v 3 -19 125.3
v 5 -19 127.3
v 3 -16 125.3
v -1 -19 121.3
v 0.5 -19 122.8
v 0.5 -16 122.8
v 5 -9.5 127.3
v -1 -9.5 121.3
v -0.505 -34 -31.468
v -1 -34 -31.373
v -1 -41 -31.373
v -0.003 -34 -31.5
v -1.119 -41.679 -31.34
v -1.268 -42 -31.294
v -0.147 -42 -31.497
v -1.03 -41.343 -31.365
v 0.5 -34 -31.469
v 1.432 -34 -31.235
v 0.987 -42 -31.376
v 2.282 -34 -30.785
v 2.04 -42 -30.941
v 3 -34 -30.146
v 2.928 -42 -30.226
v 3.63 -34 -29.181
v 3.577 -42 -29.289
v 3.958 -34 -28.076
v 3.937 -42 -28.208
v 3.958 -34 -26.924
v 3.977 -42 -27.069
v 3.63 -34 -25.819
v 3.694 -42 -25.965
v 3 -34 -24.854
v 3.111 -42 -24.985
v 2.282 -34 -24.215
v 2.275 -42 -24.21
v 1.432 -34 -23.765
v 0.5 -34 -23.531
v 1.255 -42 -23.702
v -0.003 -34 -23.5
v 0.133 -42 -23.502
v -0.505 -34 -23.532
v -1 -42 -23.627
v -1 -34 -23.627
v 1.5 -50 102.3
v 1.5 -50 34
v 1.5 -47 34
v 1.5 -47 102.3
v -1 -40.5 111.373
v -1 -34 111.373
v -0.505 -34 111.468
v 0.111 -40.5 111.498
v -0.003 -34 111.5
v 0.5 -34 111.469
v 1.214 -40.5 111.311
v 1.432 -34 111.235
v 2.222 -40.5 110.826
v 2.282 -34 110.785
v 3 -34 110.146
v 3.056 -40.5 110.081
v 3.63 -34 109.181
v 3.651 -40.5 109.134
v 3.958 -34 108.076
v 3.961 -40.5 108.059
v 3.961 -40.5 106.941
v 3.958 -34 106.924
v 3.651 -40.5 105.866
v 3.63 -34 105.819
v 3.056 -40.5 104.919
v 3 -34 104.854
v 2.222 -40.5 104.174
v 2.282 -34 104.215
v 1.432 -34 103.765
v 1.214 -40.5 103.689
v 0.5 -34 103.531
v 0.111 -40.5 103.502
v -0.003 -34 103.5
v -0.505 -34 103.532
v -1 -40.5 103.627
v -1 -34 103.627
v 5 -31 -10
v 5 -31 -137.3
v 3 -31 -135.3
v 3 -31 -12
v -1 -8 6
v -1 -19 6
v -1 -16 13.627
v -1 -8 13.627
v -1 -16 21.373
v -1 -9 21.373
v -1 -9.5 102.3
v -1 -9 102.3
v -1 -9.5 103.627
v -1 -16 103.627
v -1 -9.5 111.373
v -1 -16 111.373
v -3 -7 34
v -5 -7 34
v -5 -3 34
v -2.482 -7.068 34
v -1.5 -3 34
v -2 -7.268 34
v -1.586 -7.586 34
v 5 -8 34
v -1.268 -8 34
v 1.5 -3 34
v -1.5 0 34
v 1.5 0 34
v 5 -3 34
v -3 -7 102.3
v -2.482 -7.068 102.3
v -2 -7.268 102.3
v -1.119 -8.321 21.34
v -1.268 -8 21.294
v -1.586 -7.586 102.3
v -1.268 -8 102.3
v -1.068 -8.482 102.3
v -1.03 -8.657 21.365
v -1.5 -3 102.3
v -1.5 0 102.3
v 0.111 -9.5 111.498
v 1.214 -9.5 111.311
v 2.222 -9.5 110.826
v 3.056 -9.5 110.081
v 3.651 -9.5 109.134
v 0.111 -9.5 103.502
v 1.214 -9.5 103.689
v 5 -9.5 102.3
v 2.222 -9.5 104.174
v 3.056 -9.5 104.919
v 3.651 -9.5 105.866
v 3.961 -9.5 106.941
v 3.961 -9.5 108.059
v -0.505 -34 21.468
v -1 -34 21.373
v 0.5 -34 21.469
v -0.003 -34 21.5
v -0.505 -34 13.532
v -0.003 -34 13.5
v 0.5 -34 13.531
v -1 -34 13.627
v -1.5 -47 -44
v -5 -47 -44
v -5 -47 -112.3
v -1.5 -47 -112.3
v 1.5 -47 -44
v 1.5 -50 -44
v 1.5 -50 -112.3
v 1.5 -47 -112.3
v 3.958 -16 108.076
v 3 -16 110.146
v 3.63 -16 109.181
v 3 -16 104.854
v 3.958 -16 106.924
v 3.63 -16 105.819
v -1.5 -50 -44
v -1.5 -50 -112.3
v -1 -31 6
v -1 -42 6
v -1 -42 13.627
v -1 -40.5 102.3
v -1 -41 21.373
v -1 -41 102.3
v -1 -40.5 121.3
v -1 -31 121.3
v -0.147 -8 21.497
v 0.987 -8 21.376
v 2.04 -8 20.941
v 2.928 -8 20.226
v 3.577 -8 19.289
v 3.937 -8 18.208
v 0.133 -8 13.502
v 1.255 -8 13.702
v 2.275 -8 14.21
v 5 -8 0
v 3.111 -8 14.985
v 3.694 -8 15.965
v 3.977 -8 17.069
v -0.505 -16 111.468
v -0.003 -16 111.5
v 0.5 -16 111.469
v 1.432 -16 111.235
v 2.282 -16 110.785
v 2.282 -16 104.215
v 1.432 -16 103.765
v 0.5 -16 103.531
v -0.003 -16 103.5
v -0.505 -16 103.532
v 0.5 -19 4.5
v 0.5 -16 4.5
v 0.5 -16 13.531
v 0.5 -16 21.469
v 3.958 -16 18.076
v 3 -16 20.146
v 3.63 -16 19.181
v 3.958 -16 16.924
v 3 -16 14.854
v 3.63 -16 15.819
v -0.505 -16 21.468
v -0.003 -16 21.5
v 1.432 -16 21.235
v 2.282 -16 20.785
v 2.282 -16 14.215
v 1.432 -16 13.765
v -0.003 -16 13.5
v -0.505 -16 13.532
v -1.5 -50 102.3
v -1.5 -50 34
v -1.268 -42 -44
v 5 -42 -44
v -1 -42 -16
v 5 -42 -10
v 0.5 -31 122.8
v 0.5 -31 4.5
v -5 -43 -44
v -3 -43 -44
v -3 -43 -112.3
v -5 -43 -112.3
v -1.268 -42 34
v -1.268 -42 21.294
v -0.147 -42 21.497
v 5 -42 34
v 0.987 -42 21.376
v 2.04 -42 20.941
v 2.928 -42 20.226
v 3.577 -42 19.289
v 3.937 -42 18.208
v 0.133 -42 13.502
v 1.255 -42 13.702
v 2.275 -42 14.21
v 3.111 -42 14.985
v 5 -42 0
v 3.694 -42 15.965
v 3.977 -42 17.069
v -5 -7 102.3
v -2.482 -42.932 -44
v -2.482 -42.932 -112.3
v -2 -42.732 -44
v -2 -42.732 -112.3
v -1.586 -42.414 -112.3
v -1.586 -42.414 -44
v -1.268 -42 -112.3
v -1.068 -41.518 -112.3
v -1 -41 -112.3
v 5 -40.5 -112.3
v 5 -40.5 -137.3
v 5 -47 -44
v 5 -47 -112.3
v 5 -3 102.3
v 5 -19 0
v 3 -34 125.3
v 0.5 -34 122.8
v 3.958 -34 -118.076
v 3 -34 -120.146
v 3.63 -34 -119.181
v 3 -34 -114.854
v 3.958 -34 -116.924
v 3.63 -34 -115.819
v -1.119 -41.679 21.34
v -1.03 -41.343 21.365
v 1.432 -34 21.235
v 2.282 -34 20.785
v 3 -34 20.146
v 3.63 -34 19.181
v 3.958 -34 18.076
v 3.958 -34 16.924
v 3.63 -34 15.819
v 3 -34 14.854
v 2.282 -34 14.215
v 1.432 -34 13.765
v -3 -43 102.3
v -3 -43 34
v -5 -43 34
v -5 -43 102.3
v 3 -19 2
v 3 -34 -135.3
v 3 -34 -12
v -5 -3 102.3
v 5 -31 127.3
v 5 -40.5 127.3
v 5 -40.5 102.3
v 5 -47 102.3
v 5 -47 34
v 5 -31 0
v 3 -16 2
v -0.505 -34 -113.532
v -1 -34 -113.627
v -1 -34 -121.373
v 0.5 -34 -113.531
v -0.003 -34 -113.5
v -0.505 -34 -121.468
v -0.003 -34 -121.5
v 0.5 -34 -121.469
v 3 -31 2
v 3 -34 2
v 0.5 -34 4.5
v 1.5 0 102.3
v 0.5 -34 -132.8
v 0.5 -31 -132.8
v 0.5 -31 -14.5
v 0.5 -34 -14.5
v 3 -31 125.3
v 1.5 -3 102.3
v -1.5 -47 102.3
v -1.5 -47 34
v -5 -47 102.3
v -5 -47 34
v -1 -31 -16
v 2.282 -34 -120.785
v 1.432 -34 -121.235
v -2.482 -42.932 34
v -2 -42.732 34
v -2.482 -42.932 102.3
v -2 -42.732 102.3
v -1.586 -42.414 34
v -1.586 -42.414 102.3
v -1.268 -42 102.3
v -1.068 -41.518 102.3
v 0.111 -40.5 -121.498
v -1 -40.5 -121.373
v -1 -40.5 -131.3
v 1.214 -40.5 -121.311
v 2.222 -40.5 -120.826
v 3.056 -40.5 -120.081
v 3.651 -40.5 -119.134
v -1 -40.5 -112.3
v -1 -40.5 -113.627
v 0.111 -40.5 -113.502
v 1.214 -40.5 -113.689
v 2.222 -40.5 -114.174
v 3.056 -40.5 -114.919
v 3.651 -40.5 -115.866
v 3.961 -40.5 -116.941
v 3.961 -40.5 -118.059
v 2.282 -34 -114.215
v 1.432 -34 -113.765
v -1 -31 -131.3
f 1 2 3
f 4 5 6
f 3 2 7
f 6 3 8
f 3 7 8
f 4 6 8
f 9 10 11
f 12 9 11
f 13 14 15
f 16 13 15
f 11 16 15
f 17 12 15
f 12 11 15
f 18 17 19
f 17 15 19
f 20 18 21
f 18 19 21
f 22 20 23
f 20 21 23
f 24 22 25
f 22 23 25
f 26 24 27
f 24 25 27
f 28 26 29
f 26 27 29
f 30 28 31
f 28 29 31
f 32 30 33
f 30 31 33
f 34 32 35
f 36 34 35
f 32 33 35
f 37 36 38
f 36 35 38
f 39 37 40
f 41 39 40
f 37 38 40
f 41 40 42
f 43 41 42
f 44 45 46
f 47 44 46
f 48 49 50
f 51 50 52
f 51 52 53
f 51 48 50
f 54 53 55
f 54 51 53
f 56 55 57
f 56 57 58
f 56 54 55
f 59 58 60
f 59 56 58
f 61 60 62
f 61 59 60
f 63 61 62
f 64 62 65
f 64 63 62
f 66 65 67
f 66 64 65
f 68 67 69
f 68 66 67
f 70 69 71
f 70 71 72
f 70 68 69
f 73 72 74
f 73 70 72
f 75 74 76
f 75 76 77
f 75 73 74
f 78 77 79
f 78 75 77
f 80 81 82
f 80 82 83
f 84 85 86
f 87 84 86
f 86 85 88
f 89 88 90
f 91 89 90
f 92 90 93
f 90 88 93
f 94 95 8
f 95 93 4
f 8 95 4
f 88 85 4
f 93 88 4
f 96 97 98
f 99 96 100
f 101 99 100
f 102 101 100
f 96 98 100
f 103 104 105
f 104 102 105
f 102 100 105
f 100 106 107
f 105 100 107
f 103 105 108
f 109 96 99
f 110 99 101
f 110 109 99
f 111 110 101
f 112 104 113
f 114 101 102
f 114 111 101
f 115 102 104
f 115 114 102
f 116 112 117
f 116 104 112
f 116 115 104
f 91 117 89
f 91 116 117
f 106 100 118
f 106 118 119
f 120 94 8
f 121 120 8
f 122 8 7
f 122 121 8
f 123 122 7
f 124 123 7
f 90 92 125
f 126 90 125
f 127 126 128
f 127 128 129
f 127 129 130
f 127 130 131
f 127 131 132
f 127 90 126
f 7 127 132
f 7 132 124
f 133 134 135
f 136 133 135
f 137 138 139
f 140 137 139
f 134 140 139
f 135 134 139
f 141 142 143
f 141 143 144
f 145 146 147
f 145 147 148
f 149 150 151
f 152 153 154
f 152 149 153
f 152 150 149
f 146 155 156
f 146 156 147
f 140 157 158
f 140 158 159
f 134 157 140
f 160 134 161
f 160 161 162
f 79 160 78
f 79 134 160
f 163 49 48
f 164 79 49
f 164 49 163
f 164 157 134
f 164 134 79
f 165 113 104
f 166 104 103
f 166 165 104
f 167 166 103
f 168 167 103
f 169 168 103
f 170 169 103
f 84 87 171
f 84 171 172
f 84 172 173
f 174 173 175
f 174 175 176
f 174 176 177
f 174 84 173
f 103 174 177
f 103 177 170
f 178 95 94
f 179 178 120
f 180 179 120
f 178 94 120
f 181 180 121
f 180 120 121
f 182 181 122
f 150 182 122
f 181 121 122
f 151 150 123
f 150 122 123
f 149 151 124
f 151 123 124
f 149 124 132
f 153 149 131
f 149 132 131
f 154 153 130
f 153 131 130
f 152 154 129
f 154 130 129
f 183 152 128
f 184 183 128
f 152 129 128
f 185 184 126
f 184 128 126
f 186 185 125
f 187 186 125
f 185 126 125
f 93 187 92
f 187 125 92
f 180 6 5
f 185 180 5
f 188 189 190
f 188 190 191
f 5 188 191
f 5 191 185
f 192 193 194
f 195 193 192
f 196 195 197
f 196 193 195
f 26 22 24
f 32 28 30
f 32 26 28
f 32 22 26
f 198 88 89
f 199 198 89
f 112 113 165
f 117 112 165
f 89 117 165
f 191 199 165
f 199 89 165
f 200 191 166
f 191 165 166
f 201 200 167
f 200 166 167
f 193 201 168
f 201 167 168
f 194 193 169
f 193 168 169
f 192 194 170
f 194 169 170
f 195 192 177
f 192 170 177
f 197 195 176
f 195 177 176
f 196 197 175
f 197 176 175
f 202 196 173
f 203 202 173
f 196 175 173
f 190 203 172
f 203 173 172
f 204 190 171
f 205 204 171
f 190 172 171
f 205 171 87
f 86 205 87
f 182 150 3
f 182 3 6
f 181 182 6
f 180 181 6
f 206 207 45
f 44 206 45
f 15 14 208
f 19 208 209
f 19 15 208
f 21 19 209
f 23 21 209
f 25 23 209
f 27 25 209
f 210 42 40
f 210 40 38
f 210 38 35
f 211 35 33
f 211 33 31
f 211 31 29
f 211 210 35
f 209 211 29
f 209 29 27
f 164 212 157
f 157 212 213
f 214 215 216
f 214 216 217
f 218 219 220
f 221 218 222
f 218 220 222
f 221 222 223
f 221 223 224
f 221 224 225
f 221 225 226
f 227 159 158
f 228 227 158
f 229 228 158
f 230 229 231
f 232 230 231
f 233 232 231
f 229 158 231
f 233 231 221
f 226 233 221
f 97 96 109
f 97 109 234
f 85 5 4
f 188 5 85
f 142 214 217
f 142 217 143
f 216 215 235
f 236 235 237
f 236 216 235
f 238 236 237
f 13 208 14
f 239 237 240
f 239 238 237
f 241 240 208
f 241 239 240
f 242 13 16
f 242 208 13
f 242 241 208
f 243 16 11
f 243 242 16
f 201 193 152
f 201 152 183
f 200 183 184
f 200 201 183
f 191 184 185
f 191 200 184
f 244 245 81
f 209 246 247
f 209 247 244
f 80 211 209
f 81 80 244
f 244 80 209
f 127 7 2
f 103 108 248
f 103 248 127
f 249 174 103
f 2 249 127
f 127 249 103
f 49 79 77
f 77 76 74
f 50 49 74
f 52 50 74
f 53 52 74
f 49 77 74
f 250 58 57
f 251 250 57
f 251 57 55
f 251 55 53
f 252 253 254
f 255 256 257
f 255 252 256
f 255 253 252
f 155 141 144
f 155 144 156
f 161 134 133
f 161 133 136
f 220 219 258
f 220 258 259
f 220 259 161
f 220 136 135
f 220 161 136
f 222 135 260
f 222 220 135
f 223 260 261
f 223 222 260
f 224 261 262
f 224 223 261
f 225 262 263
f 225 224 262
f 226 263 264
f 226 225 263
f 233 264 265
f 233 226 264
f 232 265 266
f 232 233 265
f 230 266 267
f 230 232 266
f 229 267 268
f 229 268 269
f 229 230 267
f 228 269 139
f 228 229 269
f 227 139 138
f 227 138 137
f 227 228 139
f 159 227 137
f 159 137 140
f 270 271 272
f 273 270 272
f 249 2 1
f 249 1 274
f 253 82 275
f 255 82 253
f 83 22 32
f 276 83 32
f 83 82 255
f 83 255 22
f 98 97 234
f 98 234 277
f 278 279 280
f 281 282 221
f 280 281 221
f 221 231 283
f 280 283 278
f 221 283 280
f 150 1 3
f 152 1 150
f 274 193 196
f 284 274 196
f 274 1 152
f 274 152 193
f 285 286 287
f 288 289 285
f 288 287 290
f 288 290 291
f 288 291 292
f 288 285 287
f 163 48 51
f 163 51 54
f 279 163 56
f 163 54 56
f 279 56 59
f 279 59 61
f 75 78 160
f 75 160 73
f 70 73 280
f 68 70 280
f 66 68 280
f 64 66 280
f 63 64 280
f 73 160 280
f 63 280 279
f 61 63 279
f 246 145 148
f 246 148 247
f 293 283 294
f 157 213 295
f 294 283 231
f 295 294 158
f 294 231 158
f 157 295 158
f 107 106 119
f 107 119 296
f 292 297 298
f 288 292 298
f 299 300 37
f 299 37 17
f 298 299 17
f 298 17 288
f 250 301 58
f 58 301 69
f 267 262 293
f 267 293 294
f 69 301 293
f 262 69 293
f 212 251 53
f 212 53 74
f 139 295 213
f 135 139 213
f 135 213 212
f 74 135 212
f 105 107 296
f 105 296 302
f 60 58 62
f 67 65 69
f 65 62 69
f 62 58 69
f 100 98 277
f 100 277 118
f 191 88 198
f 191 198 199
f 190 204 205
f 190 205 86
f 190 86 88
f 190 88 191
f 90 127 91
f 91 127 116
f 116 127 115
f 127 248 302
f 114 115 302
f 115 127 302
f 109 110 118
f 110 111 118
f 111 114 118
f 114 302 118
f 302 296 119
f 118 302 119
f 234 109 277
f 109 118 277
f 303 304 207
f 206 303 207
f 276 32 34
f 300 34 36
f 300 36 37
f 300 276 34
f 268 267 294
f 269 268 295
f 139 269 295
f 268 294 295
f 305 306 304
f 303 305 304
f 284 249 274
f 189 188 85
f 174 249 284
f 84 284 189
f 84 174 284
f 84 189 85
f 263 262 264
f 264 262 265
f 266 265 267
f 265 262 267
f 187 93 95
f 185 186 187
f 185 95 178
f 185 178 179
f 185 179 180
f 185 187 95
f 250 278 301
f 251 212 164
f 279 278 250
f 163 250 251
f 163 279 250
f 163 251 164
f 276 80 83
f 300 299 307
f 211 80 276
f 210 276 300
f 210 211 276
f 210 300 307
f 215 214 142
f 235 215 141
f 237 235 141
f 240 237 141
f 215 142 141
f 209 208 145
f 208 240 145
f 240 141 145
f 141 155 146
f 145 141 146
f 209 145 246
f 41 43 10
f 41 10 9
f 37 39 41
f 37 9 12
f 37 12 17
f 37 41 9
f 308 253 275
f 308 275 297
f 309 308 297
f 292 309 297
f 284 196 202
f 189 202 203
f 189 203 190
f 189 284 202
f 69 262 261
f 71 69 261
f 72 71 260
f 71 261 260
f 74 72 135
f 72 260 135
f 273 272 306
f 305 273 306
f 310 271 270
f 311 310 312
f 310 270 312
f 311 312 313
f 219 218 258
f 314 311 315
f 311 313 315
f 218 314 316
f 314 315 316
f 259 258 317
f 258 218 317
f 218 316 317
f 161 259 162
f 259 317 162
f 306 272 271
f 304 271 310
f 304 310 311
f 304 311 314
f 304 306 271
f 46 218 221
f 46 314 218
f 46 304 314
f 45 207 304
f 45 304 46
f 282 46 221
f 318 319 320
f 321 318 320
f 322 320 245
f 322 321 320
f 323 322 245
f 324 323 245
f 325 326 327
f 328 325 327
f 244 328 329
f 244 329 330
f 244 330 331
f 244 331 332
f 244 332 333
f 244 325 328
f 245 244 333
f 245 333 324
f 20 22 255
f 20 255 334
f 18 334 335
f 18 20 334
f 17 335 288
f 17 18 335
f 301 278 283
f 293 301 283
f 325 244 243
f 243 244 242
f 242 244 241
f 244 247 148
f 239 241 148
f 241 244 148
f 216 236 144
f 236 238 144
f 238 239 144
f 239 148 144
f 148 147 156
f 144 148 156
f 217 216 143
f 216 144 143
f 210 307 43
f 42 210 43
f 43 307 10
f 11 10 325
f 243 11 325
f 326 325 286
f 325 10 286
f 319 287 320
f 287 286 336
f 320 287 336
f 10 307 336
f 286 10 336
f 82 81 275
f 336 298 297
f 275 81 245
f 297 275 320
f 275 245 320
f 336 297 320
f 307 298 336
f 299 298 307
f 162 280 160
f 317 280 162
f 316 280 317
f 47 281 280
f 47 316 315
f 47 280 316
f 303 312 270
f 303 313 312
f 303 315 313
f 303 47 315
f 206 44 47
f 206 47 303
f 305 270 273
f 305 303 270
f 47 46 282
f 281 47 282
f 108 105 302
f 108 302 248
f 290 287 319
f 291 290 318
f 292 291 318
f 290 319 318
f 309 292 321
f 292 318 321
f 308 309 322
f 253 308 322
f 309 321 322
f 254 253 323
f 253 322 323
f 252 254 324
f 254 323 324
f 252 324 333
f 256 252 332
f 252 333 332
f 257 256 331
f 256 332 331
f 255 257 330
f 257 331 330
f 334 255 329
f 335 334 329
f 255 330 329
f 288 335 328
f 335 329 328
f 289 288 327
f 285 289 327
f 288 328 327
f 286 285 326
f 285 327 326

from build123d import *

# Parameters (mm, degrees)
MAIN_DEPTH                      = 127.3
CUTDIAGONALE_DEPTH              = 20
CUTOTHERPIECEINROBOTRIGHT_DEPTH = 8
CUTOTHERPIECEINROBOTLEFT_DEPTH  = 9.5
SKETCH4_R                       = 4
SCREWHOLES_DEPTH                = 8
CUT_EXTRUDE4_DEPTH              = 12
FILLET1_R                       = 2


with BuildPart() as part:
    # Sketch1 → Main (new body)
    with BuildSketch(Plane.XY):
        Polygon((-5, -3), (-1.5, -3), (-1.5, 0), (1.5, 0), (1.5, -3), (5, -3), (5, -19), (3, -19), (3, -16), (0.5, -16), (0.5, -19), (-5, -19), align=None)
    extrude(amount=MAIN_DEPTH)

    # Sketch2 → CutDiagonale (cut, through all)
    with BuildSketch(Plane(origin=(0, 0, 0), x_dir=(1, 0, 0), z_dir=(0, 1, 0))):
        Polygon((5, -127.3), (-5, -117.3), (-5, -127.3), align=None)
        Polygon((5, 0), (-5, -10), (-5, 0), align=None)
    extrude(amount=-CUTDIAGONALE_DEPTH, mode=Mode.SUBTRACT)

    # Sketch3 → CutOtherPieceInRobotRight (cut)
    with BuildSketch(Plane(origin=(0, 0, 0), x_dir=(-1, 0, 0), z_dir=(0, -1, 0))):
        Polygon((5, -10), (5, -34), (-5, -34), (-5, 0), align=None)
    extrude(amount=CUTOTHERPIECEINROBOTRIGHT_DEPTH, mode=Mode.SUBTRACT)

    # Sketch6 → CutOtherPieceInRobotLeft (cut)
    with BuildSketch(Plane(origin=(0, 0, 0), x_dir=(1, 0, 0), z_dir=(0, 1, 0))):
        Polygon((5, -127.3), (5, -102.3), (-5, -102.3), (-5, -117.3), align=None)
    extrude(amount=-CUTOTHERPIECEINROBOTLEFT_DEPTH, mode=Mode.SUBTRACT)

    # Sketch4 → ScrewHoles (cut)
    with BuildSketch(Plane(origin=(0, -8, 0), x_dir=(1, 0, 0), z_dir=(0, 1, 0))):
        with Locations((0, -17.5)):
            Circle(SKETCH4_R)
        with Locations((0, -107.5)):
            Circle(SKETCH4_R)
    extrude(amount=-SCREWHOLES_DEPTH, mode=Mode.SUBTRACT)

    # Sketch5 → Cut-Extrude4 (cut)
    with BuildSketch(Plane(origin=(0, -19, 0), x_dir=(-1, 0, 0), z_dir=(0, -1, 0))):
        Polygon((1, -121.3), (5, -117.3), (5, -10), (1, -6), align=None)
    extrude(amount=-CUT_EXTRUDE4_DEPTH, mode=Mode.SUBTRACT)

    # Fillet1
    fillet1_edges = [part.edges().sort_by_distance(p)[0] for p in [
        (-1, -7, 68.15),
    ]]
    fillet(fillet1_edges, radius=FILLET1_R)


with BuildPart() as body_2:
    # Mirror1: mirrored copy
    add(part.part.mirror(Plane.ZX.offset(-25)))


with BuildPart() as body_3:
    # Mirror2: mirrored copy
    add(body_2.part.mirror(Plane.XY.offset(-5)))


solid = Compound([part.part, body_2.part, body_3.part])
